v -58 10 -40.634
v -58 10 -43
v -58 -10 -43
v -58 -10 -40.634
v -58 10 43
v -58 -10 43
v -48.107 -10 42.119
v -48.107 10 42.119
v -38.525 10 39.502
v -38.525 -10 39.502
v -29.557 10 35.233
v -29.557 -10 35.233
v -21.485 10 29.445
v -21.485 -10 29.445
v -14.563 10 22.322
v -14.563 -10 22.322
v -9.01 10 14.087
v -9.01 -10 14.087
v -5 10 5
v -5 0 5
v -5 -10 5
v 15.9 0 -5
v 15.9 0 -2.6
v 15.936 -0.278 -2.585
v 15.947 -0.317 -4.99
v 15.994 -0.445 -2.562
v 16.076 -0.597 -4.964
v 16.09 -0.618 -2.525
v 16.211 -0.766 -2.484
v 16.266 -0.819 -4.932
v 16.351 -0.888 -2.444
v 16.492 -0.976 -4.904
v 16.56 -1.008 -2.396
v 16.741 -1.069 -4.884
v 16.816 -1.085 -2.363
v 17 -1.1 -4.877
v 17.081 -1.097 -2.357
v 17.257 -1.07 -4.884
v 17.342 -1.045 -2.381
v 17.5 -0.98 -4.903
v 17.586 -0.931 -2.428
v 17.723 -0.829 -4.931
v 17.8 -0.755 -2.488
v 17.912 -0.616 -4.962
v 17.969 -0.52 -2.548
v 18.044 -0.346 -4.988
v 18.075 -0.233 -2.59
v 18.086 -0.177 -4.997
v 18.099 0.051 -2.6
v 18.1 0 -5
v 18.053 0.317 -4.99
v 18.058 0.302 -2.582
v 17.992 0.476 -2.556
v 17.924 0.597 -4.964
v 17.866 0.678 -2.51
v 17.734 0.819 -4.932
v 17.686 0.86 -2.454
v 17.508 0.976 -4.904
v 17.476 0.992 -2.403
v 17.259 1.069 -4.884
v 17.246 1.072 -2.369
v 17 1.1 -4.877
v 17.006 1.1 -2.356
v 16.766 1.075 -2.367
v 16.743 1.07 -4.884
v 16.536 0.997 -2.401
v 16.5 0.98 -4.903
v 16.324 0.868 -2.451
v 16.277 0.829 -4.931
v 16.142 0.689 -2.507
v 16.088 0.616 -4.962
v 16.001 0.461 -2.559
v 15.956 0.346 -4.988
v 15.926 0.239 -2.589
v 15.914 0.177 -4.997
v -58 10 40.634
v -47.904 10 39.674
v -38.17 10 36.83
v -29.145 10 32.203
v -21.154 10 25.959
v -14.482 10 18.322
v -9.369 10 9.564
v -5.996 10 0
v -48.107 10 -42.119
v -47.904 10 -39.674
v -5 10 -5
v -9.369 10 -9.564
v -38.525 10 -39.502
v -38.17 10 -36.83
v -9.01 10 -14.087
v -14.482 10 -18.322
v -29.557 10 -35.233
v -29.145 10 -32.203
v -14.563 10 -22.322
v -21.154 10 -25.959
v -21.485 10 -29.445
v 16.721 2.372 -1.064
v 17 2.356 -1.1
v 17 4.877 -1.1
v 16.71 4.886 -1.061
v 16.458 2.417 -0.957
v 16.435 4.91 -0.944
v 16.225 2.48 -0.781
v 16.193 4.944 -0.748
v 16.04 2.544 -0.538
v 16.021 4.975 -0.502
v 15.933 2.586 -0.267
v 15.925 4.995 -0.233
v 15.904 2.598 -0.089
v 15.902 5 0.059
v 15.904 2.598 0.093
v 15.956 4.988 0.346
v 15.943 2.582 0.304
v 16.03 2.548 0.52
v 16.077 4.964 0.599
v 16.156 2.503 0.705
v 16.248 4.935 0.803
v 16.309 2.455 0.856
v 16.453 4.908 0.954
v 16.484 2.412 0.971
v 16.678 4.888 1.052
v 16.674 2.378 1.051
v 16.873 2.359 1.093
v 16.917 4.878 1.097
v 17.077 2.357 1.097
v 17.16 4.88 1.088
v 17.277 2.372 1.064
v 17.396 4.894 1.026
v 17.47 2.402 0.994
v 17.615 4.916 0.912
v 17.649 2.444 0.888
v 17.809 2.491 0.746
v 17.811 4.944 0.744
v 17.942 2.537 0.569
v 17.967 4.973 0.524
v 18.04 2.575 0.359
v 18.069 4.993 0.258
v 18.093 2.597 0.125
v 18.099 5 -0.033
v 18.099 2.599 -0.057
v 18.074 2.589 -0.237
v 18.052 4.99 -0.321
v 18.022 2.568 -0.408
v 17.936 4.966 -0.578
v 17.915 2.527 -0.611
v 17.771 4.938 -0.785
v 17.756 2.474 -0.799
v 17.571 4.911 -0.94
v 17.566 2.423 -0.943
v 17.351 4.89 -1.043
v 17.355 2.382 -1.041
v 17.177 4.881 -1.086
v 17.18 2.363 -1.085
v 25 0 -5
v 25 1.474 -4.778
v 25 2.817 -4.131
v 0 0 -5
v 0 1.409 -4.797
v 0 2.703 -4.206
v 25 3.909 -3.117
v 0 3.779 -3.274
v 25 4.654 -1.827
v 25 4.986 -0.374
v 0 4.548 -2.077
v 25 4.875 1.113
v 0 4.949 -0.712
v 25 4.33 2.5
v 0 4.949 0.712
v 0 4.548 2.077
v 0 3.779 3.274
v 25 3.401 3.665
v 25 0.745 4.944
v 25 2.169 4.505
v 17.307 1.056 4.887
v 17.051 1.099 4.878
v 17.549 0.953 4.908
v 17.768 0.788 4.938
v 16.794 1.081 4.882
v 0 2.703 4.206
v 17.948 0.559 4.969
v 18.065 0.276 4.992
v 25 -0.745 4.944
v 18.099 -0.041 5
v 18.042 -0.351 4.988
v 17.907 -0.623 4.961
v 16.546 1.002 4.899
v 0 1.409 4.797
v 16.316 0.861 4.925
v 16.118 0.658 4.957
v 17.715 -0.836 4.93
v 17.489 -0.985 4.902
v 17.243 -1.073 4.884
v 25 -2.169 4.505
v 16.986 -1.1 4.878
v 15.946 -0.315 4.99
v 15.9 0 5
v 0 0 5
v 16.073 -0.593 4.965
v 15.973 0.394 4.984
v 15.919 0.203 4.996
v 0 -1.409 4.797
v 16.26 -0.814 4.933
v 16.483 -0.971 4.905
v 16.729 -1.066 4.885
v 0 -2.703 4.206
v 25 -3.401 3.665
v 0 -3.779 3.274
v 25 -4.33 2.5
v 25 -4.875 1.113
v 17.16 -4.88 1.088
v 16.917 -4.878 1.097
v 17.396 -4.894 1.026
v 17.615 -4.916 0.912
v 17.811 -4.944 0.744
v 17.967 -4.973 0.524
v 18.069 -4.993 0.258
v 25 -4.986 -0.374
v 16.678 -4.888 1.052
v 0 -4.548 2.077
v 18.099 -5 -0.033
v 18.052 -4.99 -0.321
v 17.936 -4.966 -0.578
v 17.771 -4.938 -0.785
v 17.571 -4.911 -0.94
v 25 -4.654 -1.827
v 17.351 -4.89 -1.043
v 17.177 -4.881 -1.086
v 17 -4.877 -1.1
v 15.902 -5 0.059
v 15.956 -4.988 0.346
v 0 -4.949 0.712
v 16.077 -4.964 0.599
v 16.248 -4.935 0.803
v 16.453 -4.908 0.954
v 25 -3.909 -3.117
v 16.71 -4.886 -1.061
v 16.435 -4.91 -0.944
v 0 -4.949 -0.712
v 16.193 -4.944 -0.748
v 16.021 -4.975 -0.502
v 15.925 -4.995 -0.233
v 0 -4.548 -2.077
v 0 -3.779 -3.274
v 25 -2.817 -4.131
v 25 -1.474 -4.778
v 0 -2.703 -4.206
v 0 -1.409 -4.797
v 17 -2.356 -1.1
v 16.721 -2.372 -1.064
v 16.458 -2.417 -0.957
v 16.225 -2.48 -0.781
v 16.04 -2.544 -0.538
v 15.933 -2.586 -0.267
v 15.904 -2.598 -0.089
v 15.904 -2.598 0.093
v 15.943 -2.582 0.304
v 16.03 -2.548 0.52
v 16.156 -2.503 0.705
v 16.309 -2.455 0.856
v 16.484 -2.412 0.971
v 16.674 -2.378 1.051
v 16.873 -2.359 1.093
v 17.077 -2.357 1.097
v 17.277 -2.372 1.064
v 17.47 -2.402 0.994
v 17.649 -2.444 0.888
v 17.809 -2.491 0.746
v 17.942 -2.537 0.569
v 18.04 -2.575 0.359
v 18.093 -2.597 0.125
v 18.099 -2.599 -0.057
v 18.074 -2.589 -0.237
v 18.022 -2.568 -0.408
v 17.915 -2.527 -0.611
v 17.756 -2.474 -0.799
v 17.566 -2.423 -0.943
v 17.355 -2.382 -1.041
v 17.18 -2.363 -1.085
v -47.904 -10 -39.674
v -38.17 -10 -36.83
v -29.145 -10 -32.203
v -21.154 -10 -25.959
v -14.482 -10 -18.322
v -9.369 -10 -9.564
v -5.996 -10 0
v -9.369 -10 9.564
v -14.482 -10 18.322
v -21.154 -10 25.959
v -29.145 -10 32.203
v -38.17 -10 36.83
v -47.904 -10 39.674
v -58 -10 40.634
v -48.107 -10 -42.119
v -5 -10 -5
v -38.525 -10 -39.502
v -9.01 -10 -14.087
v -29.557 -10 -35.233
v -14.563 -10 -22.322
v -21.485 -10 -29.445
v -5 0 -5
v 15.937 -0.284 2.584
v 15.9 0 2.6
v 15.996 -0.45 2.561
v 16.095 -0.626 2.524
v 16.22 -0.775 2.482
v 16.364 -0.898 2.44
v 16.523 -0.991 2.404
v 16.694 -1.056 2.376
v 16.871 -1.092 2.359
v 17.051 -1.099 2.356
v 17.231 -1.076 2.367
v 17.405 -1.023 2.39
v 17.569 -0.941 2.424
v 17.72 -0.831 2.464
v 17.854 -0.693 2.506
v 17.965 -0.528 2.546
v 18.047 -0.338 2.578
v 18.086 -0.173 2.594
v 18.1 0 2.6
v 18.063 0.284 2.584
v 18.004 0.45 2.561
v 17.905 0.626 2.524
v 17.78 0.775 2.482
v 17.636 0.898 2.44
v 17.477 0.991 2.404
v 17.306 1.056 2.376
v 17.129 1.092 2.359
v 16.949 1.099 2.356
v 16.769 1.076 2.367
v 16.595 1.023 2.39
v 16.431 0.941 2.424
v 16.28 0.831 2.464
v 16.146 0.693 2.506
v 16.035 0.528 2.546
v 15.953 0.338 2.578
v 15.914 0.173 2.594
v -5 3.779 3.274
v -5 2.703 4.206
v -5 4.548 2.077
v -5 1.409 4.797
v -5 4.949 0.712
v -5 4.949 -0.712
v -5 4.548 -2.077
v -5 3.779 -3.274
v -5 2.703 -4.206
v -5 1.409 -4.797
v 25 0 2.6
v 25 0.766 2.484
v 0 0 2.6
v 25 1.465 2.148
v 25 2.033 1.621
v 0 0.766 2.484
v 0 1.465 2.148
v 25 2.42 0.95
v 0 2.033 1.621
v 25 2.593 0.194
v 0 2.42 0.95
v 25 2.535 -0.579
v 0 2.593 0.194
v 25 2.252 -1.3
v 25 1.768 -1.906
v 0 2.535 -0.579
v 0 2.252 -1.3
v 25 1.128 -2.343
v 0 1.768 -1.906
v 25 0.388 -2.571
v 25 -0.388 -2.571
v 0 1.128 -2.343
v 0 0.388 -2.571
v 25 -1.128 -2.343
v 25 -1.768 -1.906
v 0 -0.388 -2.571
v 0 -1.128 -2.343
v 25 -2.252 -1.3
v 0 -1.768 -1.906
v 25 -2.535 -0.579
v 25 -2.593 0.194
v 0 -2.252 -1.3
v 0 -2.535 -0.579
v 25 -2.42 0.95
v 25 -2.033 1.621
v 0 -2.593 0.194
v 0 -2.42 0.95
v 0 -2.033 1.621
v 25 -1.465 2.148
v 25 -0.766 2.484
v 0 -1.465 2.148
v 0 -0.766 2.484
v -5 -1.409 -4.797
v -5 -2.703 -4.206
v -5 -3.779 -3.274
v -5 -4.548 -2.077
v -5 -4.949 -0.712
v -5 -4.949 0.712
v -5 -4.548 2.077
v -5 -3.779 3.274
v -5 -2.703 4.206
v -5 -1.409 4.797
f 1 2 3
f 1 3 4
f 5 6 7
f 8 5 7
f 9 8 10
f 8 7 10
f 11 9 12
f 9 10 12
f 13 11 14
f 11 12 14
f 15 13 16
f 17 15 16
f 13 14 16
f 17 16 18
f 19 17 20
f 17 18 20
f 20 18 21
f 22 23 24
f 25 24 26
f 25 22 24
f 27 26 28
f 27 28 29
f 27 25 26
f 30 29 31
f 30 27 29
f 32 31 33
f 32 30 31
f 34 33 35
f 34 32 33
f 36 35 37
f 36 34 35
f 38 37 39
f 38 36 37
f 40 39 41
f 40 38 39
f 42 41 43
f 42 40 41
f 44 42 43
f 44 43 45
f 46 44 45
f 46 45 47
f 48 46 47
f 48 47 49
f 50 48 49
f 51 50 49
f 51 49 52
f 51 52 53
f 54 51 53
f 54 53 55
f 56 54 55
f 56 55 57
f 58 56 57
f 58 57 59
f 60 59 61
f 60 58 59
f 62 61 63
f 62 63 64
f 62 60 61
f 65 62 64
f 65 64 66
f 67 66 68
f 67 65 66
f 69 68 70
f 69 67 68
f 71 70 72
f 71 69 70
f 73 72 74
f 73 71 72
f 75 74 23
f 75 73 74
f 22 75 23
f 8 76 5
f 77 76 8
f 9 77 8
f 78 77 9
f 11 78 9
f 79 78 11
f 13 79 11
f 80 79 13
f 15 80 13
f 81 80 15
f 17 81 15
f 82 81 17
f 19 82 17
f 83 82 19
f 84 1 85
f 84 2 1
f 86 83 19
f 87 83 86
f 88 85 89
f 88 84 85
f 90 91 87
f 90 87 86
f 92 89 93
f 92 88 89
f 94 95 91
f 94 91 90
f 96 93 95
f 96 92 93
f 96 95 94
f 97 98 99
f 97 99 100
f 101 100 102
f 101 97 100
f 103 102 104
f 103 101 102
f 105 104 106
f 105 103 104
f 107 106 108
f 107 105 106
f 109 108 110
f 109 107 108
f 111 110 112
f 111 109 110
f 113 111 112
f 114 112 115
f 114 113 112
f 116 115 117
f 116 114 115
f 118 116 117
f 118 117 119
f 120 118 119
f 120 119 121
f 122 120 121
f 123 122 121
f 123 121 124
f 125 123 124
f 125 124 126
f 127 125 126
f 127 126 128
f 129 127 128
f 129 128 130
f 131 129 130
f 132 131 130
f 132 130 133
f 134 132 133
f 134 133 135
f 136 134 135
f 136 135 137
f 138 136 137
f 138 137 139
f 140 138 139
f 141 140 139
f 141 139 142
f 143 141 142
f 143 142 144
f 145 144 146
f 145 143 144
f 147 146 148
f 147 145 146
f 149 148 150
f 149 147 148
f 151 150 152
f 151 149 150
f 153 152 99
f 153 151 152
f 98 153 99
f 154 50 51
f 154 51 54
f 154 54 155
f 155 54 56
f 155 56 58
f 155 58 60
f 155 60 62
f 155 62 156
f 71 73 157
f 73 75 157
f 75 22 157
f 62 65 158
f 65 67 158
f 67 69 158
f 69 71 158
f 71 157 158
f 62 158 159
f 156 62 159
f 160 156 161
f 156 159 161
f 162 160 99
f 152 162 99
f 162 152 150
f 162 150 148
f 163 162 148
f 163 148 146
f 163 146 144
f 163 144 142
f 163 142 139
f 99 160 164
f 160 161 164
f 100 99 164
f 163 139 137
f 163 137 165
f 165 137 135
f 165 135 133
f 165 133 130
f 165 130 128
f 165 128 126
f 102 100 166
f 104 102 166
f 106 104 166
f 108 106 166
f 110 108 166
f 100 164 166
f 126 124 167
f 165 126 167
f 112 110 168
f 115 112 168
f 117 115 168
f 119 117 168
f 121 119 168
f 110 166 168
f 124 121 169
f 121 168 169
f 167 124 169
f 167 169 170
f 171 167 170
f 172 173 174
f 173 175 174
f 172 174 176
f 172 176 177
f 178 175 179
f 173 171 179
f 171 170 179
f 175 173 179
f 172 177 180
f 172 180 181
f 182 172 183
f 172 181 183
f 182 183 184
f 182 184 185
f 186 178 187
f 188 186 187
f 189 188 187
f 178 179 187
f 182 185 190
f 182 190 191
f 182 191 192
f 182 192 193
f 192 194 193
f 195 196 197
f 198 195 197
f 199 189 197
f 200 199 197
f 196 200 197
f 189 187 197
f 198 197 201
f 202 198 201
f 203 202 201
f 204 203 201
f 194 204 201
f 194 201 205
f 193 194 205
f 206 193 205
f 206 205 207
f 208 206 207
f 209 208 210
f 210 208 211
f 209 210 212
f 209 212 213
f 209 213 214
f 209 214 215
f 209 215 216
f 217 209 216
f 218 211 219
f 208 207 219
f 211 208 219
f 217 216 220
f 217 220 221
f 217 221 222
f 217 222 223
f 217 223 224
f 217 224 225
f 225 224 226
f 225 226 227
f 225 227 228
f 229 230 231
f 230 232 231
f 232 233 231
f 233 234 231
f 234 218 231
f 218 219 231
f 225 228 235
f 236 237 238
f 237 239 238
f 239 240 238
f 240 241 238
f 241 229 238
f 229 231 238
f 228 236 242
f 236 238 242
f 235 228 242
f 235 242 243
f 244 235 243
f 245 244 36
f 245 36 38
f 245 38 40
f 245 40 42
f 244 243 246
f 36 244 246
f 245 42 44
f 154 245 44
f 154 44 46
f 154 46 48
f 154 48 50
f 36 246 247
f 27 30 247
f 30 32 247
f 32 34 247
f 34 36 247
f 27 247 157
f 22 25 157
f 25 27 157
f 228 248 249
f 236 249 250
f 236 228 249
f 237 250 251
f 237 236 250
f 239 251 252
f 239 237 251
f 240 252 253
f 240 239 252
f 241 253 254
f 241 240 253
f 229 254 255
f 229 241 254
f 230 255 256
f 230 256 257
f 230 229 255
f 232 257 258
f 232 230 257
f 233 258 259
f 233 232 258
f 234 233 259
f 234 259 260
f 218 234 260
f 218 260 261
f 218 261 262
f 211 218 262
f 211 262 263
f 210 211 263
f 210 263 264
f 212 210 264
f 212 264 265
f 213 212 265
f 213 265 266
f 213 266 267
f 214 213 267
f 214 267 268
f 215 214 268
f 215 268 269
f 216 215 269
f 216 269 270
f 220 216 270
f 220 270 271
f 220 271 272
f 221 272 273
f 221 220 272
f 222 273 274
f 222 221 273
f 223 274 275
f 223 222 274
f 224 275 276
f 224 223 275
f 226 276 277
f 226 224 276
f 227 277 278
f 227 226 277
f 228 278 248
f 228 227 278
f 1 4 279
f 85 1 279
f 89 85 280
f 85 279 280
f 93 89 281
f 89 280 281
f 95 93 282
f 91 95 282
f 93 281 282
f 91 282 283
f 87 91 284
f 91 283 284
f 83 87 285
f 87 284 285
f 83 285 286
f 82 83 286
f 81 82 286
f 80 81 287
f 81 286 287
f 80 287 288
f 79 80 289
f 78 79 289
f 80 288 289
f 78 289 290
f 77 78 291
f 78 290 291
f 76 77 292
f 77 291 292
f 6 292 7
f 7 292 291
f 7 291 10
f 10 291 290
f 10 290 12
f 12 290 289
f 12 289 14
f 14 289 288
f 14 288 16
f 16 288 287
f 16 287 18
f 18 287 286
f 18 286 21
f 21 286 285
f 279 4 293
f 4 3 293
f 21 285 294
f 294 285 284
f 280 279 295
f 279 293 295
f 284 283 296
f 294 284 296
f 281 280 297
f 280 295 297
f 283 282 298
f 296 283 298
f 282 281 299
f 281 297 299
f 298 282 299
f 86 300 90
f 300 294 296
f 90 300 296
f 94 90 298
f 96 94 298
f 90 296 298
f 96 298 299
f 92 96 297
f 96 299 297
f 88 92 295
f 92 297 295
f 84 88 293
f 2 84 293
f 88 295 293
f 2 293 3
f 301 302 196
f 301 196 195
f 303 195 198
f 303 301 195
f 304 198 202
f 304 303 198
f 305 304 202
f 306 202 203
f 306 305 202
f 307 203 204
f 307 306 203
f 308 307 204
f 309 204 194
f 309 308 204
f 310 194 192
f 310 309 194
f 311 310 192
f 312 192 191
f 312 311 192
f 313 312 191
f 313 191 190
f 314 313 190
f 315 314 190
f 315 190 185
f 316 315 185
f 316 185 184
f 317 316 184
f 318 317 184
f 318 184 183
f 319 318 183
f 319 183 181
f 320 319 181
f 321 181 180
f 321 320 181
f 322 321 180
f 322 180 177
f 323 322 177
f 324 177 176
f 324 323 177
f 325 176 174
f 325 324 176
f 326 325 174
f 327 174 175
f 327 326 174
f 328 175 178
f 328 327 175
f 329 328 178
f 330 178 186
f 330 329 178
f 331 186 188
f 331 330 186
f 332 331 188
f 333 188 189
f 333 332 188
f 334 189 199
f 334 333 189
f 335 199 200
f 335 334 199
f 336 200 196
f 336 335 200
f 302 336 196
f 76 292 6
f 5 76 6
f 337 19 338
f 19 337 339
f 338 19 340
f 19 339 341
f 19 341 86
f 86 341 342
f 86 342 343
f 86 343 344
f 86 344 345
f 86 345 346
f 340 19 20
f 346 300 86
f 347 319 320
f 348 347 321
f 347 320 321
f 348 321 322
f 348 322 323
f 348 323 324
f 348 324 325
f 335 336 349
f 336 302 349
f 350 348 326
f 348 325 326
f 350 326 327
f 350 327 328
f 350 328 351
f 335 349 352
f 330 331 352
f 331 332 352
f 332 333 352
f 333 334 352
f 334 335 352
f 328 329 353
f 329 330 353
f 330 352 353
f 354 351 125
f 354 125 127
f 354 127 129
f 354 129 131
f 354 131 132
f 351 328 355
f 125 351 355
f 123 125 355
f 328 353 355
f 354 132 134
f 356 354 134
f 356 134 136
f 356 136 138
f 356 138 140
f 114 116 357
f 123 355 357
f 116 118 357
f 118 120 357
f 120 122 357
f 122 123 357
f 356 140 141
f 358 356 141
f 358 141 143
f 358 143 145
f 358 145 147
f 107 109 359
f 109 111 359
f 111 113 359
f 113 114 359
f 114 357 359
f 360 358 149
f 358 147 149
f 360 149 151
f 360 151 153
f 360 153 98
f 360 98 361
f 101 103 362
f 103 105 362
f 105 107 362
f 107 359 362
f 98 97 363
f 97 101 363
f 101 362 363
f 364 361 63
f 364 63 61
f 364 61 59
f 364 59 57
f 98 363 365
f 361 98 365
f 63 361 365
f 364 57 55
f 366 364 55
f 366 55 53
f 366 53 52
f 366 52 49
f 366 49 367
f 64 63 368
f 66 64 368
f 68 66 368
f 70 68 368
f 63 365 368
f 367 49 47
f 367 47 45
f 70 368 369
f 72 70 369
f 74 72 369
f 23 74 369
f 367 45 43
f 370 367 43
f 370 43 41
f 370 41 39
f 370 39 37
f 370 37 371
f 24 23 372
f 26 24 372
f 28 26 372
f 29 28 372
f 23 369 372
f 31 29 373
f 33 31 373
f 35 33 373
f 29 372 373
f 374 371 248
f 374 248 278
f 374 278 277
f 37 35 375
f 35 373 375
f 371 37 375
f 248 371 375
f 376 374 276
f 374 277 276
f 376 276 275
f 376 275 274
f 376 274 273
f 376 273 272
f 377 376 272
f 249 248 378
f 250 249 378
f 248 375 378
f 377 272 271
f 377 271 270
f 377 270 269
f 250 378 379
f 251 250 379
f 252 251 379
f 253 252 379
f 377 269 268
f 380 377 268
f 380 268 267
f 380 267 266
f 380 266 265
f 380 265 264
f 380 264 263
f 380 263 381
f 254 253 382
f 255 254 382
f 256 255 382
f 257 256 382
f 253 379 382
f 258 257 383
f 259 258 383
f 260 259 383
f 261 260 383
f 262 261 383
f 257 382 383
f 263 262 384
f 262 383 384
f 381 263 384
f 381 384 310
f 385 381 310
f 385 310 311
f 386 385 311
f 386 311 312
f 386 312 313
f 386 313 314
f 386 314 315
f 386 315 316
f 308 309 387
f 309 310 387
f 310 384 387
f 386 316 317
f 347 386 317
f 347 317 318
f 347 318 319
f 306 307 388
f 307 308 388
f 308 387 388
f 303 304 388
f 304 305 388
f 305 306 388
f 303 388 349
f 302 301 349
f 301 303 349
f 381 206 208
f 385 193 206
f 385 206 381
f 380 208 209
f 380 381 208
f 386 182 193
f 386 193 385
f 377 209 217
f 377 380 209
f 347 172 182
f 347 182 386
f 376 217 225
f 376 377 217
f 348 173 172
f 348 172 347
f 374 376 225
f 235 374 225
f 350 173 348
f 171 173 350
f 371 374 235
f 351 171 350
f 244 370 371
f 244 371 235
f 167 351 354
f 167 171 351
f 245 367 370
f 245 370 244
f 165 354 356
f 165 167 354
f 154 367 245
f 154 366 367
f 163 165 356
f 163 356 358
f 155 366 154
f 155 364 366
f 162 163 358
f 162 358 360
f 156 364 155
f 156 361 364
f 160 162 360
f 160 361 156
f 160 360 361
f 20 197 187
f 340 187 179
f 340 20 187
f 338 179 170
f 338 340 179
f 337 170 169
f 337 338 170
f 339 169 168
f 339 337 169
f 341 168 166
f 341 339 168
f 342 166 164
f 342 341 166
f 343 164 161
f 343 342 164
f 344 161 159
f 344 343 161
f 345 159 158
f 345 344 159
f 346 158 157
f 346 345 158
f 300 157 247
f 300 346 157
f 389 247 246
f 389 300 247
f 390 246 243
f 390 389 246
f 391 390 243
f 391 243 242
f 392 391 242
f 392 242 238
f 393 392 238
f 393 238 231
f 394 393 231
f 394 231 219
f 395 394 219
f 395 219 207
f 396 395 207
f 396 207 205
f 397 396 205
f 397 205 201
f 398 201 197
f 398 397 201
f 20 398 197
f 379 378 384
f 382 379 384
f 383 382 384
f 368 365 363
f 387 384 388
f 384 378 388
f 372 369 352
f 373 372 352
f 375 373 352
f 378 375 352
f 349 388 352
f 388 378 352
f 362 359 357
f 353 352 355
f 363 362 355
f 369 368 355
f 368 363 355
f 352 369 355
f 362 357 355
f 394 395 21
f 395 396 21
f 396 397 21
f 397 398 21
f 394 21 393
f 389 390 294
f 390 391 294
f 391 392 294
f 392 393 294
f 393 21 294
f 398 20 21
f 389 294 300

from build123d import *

# Parameters (mm, degrees)
SKETCH1_R                = 5
BOSS_EXTRUDE1_DEPTH      = 25
SKETCH2_R                = 2.6
CUT_EXTRUDE1_DEPTH       = 25
CUT_EXTRUDE3_DEPTH       = 25
CUT_EXTRUDE3_DEPTH_BACK  = 25
SKETCH3_R                = 1.1
CUT_EXTRUDE4_DEPTH       = 25
CUT_EXTRUDE4_DEPTH_BACK  = 25
SKETCH4_R                = 1.1
BOSS_EXTRUDE3_START      = 5
SKETCH6_R                = 5
BOSS_EXTRUDE3_DEPTH      = 5
BOSS_EXTRUDE2_DEPTH      = 10
BOSS_EXTRUDE2_DEPTH_BACK = 10


with BuildPart() as part:
    # Sketch1 → Boss-Extrude1 (new body)
    with BuildSketch(Plane(origin=(0, 0, 0), x_dir=(0, 0, -1), z_dir=(1, 0, 0))):
        Circle(SKETCH1_R)
    extrude(amount=BOSS_EXTRUDE1_DEPTH)

    # Sketch2 → Cut-Extrude1 (cut)
    with BuildSketch(Plane.ZY):
        Circle(SKETCH2_R)
    extrude(amount=-CUT_EXTRUDE1_DEPTH, mode=Mode.SUBTRACT)

    # Sketch3 → Cut-Extrude3 (cut, two sides: drawn at the far end of the back side and taken through both)
    with BuildSketch(Plane(origin=(0, 0, 0), x_dir=(1, 0, 0), z_dir=(0, 1, 0)).offset(-CUT_EXTRUDE3_DEPTH_BACK)):
        with Locations((17, 0)):
            Circle(SKETCH3_R)
    extrude(amount=CUT_EXTRUDE3_DEPTH + CUT_EXTRUDE3_DEPTH_BACK, mode=Mode.SUBTRACT)

    # Sketch4 → Cut-Extrude4 (cut, two sides: drawn at the far end of the back side and taken through both)
    with BuildSketch(Plane.XY.offset(-CUT_EXTRUDE4_DEPTH_BACK)):
        with Locations((17, 0)):
            Circle(SKETCH4_R)
    extrude(amount=CUT_EXTRUDE4_DEPTH + CUT_EXTRUDE4_DEPTH_BACK, mode=Mode.SUBTRACT)

    # Sketch6 → Boss-Extrude3 (add)
    with BuildSketch(Plane.ZY.offset(BOSS_EXTRUDE3_START)):
        Circle(SKETCH6_R)
    extrude(amount=-BOSS_EXTRUDE3_DEPTH)

    # Sketch5 → Boss-Extrude2 (add, two sides: drawn at the far end of the back side and taken through both)
    with BuildSketch(Plane(origin=(0, 0, 0), x_dir=(1, 0, 0), z_dir=(0, 1, 0)).offset(-BOSS_EXTRUDE2_DEPTH_BACK)):
        with BuildLine():
            Line((-58, -40.633969476), (-58, -43))
            ThreePointArc((-58, -43), (-25.392485529, -32.518375447), (-5, -5))
            Line((-5, -5), (-5, 5))
            ThreePointArc((-5, 5), (-25.392485529, 32.518375447), (-58, 43))
            Line((-58, 43), (-58, 40.633969476))
            ThreePointArc((-58, 40.633969476), (-25.001840156, 29.270877002), (-5.996204592, 0))
            ThreePointArc((-5.996204592, 0), (-25.001840156, -29.270877002), (-58, -40.633969476))
        make_face()
    extrude(amount=BOSS_EXTRUDE2_DEPTH + BOSS_EXTRUDE2_DEPTH_BACK)


solid = part.part
